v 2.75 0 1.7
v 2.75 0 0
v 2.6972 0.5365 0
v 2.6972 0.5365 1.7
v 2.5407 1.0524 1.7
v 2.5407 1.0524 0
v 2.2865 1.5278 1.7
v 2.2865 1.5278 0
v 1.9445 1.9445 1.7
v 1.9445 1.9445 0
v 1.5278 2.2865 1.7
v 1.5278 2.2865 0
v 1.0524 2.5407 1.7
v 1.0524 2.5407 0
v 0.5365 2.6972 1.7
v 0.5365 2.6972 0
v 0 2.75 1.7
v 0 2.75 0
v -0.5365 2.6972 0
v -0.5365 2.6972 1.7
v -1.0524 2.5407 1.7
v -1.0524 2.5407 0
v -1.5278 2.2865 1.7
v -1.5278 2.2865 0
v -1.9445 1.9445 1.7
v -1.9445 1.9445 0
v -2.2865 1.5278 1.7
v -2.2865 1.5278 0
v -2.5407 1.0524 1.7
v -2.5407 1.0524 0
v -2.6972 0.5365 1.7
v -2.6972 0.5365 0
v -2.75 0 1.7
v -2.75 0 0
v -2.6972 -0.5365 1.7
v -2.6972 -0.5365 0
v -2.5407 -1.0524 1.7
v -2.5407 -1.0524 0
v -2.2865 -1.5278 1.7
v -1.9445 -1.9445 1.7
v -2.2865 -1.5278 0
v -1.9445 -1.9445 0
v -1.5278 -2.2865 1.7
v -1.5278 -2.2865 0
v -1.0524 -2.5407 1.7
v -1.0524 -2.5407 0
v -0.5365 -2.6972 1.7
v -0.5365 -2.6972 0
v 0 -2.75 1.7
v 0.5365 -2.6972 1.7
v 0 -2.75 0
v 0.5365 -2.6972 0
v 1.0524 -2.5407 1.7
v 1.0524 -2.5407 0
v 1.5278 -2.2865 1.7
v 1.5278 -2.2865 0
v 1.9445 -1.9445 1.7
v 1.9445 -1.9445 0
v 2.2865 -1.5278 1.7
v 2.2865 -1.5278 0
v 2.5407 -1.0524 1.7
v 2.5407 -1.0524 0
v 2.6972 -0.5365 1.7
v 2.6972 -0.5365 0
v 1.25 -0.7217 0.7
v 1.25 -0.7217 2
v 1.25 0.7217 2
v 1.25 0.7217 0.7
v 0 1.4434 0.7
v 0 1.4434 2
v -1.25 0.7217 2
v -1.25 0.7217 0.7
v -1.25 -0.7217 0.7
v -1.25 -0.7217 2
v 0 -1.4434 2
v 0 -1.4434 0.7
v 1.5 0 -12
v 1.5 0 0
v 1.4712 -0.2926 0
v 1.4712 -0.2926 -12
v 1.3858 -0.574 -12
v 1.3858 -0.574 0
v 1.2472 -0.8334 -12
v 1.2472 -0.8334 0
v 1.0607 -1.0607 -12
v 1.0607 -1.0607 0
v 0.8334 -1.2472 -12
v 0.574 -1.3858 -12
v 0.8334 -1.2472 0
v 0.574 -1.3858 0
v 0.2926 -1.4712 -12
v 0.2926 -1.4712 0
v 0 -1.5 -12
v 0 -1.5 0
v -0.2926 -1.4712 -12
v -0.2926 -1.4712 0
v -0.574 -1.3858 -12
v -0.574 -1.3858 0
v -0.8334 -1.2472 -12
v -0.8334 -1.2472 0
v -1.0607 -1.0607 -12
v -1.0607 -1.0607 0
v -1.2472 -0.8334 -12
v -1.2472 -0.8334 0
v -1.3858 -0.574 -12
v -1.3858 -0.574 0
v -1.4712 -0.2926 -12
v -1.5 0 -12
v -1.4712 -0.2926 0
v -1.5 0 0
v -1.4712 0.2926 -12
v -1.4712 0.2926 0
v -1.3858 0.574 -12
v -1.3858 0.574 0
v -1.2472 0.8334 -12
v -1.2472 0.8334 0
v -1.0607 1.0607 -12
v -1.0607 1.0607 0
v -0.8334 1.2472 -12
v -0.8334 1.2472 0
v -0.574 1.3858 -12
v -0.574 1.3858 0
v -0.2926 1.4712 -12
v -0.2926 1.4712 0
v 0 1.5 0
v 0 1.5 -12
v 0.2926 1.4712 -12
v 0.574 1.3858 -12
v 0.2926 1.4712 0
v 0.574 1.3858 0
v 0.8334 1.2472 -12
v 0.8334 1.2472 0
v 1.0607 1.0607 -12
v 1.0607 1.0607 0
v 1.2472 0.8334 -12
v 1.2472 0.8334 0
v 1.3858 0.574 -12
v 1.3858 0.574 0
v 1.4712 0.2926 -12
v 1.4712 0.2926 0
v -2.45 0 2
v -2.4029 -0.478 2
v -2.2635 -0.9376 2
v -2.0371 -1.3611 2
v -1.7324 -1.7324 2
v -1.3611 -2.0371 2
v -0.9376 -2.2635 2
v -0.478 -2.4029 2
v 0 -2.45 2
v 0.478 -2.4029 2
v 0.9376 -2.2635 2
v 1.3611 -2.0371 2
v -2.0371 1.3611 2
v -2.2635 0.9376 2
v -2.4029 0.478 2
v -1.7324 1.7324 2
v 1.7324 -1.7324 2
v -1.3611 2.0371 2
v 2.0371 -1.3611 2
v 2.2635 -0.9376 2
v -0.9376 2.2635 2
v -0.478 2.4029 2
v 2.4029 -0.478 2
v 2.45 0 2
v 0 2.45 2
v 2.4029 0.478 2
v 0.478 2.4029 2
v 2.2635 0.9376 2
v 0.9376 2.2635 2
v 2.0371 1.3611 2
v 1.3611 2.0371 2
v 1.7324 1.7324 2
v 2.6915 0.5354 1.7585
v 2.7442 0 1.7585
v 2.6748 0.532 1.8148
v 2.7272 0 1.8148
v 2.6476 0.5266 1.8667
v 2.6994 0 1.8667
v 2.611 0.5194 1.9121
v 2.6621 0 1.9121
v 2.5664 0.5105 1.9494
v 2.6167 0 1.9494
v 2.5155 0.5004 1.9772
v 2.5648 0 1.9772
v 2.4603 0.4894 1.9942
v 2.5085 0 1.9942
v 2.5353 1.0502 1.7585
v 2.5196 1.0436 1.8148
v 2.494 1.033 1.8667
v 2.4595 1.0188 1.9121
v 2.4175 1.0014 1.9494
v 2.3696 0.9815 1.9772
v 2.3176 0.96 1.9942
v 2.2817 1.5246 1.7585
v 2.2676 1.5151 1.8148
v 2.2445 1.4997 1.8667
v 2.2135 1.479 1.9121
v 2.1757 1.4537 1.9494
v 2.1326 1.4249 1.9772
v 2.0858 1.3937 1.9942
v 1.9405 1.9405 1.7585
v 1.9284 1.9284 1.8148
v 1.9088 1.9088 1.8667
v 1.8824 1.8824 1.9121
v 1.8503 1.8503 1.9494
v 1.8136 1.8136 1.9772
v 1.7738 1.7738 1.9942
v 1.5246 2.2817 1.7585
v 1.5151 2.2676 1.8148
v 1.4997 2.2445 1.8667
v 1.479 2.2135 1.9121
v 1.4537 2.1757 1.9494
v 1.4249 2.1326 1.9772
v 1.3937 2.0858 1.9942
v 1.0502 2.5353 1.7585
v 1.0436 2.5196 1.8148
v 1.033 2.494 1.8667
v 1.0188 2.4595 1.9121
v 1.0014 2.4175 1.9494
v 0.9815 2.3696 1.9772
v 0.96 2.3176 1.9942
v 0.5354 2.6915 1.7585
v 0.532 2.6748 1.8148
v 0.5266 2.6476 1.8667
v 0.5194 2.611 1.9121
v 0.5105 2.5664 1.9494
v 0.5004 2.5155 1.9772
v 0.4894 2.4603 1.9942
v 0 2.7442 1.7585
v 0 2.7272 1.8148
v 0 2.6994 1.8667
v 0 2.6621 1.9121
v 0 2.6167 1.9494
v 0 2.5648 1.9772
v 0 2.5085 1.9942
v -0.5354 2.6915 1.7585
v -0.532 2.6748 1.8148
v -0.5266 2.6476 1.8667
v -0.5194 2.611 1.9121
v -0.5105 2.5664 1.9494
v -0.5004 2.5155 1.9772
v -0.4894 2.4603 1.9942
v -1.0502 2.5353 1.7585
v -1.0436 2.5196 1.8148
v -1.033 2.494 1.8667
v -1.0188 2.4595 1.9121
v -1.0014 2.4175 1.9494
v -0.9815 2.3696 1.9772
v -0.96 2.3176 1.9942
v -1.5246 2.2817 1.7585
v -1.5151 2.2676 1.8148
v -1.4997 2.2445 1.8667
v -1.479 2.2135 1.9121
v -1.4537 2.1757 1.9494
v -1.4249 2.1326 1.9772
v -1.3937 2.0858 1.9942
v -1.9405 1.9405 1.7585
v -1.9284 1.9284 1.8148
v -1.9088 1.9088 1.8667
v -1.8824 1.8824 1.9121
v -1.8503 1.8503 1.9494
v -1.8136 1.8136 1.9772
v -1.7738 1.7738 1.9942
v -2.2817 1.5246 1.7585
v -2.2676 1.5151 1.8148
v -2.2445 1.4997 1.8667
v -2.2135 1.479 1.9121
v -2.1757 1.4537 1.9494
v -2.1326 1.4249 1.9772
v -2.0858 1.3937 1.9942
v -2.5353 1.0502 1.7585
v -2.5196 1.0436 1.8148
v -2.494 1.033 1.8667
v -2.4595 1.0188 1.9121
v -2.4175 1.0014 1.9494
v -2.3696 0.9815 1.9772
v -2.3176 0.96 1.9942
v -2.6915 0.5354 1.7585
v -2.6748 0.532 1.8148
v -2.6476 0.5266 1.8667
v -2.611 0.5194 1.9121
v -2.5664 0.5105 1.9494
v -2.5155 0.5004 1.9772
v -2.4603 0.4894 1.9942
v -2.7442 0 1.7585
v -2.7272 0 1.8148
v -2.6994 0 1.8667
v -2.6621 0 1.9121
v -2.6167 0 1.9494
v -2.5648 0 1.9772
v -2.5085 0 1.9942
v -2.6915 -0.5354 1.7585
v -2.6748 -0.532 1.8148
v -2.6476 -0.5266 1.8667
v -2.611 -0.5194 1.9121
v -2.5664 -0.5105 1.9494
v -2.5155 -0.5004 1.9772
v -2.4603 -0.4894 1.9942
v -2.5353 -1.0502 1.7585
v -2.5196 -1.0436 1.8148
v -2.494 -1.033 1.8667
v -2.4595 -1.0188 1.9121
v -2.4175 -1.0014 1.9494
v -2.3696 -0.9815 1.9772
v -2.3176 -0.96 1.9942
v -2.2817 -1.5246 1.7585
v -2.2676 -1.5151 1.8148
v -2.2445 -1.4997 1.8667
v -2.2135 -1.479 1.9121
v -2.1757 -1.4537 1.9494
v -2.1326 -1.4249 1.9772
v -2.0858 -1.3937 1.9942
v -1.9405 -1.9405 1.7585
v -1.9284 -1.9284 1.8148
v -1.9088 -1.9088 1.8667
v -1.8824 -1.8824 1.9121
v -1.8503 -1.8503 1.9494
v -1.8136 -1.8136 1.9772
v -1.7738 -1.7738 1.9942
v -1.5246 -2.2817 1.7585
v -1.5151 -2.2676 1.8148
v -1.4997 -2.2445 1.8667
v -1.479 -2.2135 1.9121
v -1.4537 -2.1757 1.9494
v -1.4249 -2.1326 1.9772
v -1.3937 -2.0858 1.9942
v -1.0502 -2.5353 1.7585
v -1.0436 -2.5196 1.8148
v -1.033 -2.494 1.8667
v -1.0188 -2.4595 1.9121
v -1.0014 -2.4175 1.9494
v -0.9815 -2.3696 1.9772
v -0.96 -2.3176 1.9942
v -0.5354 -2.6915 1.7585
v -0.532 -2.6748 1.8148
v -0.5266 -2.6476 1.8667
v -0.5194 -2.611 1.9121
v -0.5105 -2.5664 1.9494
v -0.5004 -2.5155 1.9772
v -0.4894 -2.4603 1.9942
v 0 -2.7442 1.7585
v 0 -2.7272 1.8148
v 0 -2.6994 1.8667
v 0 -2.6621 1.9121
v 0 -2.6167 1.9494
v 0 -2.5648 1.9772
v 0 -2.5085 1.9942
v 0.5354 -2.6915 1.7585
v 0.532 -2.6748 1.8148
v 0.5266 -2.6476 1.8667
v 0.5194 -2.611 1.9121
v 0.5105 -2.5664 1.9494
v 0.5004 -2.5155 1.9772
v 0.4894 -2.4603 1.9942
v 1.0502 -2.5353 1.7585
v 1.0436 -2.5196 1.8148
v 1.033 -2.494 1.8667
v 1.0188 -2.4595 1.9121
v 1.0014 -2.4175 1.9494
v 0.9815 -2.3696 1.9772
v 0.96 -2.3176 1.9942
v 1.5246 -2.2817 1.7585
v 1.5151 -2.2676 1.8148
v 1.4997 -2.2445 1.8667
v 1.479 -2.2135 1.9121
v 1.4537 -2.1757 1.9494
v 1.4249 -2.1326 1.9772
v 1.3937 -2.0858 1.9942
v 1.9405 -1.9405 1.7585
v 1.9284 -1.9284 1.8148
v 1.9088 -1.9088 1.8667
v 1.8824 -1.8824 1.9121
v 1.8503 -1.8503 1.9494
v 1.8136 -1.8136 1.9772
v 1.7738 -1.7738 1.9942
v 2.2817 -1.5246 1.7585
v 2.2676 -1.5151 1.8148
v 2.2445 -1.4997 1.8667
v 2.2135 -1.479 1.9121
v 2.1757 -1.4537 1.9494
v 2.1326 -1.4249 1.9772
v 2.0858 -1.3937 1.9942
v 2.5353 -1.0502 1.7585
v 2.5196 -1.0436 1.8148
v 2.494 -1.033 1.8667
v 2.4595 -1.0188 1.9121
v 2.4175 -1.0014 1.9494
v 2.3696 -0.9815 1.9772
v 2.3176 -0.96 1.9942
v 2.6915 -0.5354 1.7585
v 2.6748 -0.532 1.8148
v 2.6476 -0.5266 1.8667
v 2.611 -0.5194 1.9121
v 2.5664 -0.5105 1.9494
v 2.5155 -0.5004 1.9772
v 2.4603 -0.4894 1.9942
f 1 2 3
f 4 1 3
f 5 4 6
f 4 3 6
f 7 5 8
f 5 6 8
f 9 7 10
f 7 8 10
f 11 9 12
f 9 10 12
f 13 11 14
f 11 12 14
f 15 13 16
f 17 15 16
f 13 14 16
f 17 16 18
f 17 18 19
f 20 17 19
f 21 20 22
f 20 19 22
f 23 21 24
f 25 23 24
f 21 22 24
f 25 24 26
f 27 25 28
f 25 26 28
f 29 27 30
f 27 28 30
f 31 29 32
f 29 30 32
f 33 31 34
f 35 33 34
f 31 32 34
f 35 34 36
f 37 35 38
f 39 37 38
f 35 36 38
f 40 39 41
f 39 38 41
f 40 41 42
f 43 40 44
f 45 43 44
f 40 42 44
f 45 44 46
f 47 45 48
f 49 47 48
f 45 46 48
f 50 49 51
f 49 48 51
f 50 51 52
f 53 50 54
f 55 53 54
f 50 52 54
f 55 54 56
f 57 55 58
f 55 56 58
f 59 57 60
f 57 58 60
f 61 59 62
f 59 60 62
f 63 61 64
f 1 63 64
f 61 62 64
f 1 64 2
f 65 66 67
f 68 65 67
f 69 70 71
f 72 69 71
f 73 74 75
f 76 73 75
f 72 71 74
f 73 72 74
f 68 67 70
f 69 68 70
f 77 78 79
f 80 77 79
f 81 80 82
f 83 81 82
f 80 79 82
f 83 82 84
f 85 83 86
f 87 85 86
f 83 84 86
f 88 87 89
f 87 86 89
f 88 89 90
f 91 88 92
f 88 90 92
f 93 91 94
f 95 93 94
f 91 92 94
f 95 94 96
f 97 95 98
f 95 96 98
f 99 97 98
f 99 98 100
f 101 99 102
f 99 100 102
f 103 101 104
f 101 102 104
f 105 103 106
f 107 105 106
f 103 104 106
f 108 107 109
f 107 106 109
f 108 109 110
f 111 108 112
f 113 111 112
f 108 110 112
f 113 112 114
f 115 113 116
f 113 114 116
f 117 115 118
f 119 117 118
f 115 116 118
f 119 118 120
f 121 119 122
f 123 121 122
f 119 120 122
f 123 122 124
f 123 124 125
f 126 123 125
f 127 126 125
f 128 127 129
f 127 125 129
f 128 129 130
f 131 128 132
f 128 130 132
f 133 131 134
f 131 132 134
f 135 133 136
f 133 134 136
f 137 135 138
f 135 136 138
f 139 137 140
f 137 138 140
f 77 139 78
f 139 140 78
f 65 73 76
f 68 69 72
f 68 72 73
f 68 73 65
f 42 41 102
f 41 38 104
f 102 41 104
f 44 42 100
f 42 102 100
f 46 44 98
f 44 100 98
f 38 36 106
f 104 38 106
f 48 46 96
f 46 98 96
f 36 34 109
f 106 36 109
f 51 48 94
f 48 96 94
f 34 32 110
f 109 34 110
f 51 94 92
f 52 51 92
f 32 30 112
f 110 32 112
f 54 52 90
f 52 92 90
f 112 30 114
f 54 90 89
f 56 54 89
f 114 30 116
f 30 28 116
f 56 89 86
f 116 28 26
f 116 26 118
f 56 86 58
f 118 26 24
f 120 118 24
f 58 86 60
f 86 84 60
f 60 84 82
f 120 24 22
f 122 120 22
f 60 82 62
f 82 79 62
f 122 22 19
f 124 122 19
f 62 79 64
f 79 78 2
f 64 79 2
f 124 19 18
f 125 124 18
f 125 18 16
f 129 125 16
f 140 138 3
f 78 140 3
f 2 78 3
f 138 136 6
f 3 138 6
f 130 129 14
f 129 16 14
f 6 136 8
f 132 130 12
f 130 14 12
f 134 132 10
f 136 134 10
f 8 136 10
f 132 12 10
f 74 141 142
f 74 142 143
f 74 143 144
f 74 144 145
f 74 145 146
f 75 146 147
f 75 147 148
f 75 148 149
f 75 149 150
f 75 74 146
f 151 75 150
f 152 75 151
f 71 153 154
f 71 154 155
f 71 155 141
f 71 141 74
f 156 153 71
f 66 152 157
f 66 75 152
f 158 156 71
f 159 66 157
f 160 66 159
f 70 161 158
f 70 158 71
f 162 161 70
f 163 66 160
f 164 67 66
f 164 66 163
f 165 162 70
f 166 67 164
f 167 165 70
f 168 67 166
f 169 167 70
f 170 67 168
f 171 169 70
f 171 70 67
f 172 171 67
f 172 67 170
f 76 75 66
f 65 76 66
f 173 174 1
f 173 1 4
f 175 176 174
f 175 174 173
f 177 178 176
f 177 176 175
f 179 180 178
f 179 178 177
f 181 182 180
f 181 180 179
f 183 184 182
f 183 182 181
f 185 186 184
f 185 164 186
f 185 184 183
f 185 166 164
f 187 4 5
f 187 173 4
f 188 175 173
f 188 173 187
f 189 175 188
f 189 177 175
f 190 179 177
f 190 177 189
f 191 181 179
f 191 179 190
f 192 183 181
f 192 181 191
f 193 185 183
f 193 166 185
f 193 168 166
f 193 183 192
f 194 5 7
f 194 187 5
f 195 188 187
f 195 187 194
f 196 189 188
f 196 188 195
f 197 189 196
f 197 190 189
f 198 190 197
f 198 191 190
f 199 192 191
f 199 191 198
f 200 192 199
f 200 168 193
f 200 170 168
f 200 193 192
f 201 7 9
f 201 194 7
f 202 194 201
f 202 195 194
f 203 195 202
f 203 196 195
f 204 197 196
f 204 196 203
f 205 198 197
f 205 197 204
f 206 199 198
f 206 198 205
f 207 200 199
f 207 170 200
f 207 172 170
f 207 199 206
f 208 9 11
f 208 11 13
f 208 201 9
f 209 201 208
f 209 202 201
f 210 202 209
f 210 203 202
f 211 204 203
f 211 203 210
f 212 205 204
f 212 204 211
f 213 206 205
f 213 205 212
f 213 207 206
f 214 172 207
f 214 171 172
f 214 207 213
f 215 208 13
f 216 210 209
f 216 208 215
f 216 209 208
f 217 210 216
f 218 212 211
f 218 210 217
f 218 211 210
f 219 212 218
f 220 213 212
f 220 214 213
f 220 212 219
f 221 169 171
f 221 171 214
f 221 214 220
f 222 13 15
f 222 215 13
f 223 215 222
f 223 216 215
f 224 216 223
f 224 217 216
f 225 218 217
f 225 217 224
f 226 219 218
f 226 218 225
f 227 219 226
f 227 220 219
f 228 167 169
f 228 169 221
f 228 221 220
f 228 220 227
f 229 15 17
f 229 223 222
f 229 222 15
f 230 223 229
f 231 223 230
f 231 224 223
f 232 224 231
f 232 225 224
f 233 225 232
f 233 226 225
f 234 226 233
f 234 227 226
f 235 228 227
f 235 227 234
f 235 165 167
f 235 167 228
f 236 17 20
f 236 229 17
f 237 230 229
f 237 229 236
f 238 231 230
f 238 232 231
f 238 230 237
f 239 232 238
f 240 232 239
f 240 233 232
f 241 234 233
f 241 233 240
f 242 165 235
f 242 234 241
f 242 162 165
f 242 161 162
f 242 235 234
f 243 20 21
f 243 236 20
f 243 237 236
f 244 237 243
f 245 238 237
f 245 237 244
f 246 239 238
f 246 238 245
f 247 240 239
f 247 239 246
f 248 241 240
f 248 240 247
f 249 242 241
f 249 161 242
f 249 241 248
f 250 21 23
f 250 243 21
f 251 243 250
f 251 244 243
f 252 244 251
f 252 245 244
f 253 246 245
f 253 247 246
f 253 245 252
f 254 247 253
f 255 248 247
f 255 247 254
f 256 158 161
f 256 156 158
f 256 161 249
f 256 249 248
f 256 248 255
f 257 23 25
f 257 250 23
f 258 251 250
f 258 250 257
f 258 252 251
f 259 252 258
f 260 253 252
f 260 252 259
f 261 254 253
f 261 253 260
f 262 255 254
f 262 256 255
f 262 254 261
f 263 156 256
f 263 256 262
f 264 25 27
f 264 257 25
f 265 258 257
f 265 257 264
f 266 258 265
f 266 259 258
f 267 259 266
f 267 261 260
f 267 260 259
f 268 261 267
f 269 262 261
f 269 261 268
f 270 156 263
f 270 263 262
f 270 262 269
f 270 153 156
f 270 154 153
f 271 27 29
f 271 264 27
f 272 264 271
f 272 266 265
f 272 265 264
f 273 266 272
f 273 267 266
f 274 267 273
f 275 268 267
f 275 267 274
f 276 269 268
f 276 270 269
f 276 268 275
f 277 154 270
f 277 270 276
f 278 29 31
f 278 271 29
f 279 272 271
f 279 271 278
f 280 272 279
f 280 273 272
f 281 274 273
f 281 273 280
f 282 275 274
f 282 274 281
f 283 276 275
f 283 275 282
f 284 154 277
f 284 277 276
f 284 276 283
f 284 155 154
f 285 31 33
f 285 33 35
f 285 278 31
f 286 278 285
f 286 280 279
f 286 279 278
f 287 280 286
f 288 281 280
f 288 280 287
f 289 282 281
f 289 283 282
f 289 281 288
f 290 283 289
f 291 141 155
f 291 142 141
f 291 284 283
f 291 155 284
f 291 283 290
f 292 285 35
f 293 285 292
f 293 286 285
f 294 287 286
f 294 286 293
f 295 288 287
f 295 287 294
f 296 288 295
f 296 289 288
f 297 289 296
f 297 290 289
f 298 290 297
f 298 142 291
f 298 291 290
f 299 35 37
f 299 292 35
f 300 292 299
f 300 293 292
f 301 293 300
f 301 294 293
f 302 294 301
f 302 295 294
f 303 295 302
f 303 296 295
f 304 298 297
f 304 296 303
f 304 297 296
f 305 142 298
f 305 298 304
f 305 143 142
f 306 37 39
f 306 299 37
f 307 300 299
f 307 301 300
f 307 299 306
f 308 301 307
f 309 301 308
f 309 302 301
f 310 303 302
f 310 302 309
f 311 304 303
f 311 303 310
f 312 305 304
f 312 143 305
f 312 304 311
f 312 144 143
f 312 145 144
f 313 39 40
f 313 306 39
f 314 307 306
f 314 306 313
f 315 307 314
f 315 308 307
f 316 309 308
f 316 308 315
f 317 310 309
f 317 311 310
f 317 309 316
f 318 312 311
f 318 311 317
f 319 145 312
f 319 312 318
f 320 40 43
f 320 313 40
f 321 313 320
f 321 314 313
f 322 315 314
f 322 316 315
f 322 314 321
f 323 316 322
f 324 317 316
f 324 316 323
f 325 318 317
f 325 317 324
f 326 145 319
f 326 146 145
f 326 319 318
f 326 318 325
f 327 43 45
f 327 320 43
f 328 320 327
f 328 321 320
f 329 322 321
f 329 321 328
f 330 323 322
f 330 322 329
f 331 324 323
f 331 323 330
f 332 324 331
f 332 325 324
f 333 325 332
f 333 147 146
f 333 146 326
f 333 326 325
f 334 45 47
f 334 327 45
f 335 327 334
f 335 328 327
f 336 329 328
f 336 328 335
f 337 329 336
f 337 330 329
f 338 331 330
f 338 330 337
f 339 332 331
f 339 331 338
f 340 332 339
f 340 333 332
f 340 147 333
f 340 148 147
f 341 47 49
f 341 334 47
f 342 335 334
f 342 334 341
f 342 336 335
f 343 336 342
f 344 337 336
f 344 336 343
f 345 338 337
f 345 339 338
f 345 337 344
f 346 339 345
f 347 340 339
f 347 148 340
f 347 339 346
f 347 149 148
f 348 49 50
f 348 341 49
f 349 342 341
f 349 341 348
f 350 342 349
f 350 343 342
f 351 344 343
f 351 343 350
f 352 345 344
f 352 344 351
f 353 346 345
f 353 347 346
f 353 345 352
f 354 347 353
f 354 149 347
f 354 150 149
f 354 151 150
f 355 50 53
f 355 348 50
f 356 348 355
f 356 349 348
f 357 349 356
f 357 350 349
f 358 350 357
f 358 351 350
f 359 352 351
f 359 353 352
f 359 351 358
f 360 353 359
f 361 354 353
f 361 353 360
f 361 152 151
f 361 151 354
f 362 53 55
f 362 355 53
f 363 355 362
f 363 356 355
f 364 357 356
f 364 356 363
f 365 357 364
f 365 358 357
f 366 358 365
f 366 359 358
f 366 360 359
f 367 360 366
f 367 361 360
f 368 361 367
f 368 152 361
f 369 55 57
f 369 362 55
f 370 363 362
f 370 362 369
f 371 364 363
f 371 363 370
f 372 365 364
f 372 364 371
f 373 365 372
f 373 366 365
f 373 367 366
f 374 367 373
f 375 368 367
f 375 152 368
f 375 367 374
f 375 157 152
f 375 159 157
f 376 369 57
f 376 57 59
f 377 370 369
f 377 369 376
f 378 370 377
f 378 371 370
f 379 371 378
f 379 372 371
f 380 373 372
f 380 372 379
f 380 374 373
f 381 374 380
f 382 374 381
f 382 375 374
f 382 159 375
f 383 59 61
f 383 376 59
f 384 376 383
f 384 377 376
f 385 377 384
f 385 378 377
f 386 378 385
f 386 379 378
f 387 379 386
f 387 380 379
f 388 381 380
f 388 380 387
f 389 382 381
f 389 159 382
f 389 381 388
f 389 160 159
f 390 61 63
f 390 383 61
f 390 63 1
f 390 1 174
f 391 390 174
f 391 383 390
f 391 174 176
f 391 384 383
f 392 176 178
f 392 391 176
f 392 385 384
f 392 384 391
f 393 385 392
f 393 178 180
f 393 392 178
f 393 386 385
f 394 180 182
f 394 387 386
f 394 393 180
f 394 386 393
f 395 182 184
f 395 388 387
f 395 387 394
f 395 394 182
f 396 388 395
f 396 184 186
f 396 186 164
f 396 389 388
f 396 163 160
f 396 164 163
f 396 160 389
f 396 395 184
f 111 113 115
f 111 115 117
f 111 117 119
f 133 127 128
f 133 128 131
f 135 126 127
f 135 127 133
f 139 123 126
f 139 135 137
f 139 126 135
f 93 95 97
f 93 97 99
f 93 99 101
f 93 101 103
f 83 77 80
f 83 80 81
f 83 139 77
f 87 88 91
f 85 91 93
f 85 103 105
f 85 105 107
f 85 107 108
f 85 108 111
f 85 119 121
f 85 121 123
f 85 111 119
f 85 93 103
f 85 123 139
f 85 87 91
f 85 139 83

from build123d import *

# Parameters (mm, degrees)
F0_R     = 2.75
F1_DEPTH = 2
F3_DEPTH = 1.3
F4_R     = 1.5
F5_DEPTH = 12
F6_R     = 0.3


with BuildPart() as f1:
    # F0 (on Top) → F1 (new body)
    with BuildSketch(Plane.XY):
        Circle(F0_R)
    extrude(amount=F1_DEPTH)

    # F2 (on face) → F3 (cut)
    with BuildSketch(Plane.XY.offset(2)):
        Polygon((1.25, -0.721688), (1.25, 0.721688), (0, 1.443376), (-1.25, 0.721688), (-1.25, -0.721688), (0, -1.443376), align=None)
    extrude(amount=-F3_DEPTH, mode=Mode.SUBTRACT)

    # F4 (on face) → F5 (join)
    with BuildSketch(Plane(origin=(0, 0, 0), x_dir=(1, 0, 0), z_dir=(0, 0, -1))):
        Circle(F4_R)
    extrude(amount=F5_DEPTH)

    # F6
    f6_edges = [f1.edges().sort_by_distance(p)[0] for p in [
        (-2.75, 0, 2),
    ]]
    fillet(f6_edges, radius=F6_R)


solid = f1.part
